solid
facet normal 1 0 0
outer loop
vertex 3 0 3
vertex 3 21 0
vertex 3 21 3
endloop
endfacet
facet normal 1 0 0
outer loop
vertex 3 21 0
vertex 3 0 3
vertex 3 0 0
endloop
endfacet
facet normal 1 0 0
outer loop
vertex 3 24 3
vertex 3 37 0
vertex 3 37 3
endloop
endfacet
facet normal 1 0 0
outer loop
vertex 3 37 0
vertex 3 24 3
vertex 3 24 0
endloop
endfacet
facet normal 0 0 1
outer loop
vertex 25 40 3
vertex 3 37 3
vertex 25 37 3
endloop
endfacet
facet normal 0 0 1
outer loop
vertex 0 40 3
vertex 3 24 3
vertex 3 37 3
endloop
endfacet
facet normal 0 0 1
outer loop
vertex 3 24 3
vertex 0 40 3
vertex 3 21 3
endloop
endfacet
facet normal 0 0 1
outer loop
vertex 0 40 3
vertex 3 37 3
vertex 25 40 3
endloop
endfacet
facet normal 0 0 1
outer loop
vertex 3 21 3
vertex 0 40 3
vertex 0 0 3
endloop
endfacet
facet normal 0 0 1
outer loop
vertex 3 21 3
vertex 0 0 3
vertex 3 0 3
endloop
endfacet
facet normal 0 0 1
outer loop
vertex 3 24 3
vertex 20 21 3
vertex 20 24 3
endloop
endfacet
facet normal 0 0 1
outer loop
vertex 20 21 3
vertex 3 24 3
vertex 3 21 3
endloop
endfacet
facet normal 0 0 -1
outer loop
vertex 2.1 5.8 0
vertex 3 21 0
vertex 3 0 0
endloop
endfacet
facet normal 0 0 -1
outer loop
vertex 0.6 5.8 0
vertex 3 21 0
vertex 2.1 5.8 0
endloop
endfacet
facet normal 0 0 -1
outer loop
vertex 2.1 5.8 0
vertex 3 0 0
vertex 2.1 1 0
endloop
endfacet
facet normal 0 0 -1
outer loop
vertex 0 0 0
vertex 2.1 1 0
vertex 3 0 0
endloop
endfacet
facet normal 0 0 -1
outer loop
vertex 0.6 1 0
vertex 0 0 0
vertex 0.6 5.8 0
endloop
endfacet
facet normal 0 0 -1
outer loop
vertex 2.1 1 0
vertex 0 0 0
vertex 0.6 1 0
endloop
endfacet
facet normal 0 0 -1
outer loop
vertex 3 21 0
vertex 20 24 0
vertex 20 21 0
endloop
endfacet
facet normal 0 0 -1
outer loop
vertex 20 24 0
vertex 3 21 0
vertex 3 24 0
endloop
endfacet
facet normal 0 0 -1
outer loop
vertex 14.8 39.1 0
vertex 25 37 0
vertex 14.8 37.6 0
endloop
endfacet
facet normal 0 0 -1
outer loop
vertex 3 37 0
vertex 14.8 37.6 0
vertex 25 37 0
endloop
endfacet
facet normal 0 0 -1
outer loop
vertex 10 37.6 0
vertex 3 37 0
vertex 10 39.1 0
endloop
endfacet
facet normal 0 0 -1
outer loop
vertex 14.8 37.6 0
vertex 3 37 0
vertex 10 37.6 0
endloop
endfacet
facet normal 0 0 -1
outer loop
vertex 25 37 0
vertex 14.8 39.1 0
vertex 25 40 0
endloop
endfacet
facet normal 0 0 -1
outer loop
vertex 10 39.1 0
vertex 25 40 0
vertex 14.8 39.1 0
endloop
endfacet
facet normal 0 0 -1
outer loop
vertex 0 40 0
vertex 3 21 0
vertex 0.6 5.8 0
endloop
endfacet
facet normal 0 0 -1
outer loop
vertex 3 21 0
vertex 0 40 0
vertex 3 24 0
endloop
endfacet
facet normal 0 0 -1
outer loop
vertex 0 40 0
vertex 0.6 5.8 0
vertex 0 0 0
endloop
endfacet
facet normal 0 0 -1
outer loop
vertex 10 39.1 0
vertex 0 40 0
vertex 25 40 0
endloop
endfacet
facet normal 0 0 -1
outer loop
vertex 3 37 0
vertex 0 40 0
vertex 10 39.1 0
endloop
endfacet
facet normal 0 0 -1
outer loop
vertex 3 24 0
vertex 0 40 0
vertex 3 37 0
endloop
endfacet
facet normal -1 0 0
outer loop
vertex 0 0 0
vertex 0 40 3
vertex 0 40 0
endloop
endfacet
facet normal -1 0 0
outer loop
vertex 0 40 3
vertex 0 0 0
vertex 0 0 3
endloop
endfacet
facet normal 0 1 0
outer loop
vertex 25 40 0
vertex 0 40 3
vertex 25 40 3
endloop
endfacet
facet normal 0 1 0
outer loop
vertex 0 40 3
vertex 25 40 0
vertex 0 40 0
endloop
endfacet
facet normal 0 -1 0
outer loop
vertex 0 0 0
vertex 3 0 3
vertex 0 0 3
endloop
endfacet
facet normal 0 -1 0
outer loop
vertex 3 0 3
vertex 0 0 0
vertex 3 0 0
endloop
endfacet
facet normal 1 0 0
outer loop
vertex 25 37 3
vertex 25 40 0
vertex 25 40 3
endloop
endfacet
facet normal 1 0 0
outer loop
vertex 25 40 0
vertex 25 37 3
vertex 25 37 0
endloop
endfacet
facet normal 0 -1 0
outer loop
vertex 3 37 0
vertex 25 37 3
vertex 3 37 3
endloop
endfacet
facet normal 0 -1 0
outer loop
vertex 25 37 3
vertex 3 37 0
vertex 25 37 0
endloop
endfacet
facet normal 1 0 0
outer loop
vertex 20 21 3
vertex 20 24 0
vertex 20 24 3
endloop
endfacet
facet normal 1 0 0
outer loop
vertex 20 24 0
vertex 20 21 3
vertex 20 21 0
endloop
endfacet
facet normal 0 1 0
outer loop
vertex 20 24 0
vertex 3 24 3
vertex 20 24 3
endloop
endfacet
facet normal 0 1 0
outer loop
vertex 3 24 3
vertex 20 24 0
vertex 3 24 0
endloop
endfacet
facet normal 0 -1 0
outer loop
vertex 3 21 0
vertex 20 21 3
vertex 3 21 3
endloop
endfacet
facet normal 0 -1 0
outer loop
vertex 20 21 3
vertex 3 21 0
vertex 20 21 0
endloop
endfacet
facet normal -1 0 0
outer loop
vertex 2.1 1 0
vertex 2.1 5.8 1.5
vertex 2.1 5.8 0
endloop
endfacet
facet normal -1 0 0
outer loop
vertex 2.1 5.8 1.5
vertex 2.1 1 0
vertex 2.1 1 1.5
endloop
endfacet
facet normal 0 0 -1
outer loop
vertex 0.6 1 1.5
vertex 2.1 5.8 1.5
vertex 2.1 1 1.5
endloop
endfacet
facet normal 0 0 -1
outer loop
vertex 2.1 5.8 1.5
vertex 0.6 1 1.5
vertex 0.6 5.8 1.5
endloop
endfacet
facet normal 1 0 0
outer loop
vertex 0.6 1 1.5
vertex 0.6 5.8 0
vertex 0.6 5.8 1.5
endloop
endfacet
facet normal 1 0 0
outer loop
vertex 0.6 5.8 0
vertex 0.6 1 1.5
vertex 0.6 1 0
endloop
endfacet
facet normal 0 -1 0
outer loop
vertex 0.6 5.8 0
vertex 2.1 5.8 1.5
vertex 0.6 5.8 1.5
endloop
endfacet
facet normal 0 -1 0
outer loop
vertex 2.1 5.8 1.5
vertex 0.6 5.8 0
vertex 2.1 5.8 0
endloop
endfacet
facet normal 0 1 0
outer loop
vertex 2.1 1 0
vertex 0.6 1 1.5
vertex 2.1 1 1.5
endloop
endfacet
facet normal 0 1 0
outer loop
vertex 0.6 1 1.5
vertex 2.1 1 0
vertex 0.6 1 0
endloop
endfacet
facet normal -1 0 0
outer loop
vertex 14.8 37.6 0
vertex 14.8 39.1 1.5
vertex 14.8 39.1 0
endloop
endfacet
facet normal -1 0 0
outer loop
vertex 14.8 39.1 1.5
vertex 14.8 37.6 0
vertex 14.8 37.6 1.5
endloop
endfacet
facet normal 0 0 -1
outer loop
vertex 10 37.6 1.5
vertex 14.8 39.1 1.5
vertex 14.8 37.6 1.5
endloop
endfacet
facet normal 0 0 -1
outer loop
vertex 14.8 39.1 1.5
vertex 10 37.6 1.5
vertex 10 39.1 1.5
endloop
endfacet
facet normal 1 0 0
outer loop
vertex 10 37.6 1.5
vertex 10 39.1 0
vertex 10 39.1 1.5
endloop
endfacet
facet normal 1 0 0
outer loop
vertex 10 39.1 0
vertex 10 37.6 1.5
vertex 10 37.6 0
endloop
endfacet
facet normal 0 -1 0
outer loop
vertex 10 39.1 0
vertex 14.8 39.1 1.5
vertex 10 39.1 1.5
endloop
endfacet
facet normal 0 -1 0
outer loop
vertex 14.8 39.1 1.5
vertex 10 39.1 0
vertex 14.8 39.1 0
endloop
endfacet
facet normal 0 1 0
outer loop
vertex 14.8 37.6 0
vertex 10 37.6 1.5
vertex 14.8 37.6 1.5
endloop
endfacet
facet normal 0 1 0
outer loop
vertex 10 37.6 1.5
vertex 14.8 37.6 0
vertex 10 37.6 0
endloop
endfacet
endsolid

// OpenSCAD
//F
difference(){
 union(){
  cube([3,40,3]);
  translate([0,37,0]) cube([25,3,3]);
  translate([0,21,0]) cube([20,3,3]);
}
 translate([0.6,1,0]) cube([1.5,4.8,1.5]);
 translate([10,37.6,0]) cube([4.8,1.5,1.5]);

}
